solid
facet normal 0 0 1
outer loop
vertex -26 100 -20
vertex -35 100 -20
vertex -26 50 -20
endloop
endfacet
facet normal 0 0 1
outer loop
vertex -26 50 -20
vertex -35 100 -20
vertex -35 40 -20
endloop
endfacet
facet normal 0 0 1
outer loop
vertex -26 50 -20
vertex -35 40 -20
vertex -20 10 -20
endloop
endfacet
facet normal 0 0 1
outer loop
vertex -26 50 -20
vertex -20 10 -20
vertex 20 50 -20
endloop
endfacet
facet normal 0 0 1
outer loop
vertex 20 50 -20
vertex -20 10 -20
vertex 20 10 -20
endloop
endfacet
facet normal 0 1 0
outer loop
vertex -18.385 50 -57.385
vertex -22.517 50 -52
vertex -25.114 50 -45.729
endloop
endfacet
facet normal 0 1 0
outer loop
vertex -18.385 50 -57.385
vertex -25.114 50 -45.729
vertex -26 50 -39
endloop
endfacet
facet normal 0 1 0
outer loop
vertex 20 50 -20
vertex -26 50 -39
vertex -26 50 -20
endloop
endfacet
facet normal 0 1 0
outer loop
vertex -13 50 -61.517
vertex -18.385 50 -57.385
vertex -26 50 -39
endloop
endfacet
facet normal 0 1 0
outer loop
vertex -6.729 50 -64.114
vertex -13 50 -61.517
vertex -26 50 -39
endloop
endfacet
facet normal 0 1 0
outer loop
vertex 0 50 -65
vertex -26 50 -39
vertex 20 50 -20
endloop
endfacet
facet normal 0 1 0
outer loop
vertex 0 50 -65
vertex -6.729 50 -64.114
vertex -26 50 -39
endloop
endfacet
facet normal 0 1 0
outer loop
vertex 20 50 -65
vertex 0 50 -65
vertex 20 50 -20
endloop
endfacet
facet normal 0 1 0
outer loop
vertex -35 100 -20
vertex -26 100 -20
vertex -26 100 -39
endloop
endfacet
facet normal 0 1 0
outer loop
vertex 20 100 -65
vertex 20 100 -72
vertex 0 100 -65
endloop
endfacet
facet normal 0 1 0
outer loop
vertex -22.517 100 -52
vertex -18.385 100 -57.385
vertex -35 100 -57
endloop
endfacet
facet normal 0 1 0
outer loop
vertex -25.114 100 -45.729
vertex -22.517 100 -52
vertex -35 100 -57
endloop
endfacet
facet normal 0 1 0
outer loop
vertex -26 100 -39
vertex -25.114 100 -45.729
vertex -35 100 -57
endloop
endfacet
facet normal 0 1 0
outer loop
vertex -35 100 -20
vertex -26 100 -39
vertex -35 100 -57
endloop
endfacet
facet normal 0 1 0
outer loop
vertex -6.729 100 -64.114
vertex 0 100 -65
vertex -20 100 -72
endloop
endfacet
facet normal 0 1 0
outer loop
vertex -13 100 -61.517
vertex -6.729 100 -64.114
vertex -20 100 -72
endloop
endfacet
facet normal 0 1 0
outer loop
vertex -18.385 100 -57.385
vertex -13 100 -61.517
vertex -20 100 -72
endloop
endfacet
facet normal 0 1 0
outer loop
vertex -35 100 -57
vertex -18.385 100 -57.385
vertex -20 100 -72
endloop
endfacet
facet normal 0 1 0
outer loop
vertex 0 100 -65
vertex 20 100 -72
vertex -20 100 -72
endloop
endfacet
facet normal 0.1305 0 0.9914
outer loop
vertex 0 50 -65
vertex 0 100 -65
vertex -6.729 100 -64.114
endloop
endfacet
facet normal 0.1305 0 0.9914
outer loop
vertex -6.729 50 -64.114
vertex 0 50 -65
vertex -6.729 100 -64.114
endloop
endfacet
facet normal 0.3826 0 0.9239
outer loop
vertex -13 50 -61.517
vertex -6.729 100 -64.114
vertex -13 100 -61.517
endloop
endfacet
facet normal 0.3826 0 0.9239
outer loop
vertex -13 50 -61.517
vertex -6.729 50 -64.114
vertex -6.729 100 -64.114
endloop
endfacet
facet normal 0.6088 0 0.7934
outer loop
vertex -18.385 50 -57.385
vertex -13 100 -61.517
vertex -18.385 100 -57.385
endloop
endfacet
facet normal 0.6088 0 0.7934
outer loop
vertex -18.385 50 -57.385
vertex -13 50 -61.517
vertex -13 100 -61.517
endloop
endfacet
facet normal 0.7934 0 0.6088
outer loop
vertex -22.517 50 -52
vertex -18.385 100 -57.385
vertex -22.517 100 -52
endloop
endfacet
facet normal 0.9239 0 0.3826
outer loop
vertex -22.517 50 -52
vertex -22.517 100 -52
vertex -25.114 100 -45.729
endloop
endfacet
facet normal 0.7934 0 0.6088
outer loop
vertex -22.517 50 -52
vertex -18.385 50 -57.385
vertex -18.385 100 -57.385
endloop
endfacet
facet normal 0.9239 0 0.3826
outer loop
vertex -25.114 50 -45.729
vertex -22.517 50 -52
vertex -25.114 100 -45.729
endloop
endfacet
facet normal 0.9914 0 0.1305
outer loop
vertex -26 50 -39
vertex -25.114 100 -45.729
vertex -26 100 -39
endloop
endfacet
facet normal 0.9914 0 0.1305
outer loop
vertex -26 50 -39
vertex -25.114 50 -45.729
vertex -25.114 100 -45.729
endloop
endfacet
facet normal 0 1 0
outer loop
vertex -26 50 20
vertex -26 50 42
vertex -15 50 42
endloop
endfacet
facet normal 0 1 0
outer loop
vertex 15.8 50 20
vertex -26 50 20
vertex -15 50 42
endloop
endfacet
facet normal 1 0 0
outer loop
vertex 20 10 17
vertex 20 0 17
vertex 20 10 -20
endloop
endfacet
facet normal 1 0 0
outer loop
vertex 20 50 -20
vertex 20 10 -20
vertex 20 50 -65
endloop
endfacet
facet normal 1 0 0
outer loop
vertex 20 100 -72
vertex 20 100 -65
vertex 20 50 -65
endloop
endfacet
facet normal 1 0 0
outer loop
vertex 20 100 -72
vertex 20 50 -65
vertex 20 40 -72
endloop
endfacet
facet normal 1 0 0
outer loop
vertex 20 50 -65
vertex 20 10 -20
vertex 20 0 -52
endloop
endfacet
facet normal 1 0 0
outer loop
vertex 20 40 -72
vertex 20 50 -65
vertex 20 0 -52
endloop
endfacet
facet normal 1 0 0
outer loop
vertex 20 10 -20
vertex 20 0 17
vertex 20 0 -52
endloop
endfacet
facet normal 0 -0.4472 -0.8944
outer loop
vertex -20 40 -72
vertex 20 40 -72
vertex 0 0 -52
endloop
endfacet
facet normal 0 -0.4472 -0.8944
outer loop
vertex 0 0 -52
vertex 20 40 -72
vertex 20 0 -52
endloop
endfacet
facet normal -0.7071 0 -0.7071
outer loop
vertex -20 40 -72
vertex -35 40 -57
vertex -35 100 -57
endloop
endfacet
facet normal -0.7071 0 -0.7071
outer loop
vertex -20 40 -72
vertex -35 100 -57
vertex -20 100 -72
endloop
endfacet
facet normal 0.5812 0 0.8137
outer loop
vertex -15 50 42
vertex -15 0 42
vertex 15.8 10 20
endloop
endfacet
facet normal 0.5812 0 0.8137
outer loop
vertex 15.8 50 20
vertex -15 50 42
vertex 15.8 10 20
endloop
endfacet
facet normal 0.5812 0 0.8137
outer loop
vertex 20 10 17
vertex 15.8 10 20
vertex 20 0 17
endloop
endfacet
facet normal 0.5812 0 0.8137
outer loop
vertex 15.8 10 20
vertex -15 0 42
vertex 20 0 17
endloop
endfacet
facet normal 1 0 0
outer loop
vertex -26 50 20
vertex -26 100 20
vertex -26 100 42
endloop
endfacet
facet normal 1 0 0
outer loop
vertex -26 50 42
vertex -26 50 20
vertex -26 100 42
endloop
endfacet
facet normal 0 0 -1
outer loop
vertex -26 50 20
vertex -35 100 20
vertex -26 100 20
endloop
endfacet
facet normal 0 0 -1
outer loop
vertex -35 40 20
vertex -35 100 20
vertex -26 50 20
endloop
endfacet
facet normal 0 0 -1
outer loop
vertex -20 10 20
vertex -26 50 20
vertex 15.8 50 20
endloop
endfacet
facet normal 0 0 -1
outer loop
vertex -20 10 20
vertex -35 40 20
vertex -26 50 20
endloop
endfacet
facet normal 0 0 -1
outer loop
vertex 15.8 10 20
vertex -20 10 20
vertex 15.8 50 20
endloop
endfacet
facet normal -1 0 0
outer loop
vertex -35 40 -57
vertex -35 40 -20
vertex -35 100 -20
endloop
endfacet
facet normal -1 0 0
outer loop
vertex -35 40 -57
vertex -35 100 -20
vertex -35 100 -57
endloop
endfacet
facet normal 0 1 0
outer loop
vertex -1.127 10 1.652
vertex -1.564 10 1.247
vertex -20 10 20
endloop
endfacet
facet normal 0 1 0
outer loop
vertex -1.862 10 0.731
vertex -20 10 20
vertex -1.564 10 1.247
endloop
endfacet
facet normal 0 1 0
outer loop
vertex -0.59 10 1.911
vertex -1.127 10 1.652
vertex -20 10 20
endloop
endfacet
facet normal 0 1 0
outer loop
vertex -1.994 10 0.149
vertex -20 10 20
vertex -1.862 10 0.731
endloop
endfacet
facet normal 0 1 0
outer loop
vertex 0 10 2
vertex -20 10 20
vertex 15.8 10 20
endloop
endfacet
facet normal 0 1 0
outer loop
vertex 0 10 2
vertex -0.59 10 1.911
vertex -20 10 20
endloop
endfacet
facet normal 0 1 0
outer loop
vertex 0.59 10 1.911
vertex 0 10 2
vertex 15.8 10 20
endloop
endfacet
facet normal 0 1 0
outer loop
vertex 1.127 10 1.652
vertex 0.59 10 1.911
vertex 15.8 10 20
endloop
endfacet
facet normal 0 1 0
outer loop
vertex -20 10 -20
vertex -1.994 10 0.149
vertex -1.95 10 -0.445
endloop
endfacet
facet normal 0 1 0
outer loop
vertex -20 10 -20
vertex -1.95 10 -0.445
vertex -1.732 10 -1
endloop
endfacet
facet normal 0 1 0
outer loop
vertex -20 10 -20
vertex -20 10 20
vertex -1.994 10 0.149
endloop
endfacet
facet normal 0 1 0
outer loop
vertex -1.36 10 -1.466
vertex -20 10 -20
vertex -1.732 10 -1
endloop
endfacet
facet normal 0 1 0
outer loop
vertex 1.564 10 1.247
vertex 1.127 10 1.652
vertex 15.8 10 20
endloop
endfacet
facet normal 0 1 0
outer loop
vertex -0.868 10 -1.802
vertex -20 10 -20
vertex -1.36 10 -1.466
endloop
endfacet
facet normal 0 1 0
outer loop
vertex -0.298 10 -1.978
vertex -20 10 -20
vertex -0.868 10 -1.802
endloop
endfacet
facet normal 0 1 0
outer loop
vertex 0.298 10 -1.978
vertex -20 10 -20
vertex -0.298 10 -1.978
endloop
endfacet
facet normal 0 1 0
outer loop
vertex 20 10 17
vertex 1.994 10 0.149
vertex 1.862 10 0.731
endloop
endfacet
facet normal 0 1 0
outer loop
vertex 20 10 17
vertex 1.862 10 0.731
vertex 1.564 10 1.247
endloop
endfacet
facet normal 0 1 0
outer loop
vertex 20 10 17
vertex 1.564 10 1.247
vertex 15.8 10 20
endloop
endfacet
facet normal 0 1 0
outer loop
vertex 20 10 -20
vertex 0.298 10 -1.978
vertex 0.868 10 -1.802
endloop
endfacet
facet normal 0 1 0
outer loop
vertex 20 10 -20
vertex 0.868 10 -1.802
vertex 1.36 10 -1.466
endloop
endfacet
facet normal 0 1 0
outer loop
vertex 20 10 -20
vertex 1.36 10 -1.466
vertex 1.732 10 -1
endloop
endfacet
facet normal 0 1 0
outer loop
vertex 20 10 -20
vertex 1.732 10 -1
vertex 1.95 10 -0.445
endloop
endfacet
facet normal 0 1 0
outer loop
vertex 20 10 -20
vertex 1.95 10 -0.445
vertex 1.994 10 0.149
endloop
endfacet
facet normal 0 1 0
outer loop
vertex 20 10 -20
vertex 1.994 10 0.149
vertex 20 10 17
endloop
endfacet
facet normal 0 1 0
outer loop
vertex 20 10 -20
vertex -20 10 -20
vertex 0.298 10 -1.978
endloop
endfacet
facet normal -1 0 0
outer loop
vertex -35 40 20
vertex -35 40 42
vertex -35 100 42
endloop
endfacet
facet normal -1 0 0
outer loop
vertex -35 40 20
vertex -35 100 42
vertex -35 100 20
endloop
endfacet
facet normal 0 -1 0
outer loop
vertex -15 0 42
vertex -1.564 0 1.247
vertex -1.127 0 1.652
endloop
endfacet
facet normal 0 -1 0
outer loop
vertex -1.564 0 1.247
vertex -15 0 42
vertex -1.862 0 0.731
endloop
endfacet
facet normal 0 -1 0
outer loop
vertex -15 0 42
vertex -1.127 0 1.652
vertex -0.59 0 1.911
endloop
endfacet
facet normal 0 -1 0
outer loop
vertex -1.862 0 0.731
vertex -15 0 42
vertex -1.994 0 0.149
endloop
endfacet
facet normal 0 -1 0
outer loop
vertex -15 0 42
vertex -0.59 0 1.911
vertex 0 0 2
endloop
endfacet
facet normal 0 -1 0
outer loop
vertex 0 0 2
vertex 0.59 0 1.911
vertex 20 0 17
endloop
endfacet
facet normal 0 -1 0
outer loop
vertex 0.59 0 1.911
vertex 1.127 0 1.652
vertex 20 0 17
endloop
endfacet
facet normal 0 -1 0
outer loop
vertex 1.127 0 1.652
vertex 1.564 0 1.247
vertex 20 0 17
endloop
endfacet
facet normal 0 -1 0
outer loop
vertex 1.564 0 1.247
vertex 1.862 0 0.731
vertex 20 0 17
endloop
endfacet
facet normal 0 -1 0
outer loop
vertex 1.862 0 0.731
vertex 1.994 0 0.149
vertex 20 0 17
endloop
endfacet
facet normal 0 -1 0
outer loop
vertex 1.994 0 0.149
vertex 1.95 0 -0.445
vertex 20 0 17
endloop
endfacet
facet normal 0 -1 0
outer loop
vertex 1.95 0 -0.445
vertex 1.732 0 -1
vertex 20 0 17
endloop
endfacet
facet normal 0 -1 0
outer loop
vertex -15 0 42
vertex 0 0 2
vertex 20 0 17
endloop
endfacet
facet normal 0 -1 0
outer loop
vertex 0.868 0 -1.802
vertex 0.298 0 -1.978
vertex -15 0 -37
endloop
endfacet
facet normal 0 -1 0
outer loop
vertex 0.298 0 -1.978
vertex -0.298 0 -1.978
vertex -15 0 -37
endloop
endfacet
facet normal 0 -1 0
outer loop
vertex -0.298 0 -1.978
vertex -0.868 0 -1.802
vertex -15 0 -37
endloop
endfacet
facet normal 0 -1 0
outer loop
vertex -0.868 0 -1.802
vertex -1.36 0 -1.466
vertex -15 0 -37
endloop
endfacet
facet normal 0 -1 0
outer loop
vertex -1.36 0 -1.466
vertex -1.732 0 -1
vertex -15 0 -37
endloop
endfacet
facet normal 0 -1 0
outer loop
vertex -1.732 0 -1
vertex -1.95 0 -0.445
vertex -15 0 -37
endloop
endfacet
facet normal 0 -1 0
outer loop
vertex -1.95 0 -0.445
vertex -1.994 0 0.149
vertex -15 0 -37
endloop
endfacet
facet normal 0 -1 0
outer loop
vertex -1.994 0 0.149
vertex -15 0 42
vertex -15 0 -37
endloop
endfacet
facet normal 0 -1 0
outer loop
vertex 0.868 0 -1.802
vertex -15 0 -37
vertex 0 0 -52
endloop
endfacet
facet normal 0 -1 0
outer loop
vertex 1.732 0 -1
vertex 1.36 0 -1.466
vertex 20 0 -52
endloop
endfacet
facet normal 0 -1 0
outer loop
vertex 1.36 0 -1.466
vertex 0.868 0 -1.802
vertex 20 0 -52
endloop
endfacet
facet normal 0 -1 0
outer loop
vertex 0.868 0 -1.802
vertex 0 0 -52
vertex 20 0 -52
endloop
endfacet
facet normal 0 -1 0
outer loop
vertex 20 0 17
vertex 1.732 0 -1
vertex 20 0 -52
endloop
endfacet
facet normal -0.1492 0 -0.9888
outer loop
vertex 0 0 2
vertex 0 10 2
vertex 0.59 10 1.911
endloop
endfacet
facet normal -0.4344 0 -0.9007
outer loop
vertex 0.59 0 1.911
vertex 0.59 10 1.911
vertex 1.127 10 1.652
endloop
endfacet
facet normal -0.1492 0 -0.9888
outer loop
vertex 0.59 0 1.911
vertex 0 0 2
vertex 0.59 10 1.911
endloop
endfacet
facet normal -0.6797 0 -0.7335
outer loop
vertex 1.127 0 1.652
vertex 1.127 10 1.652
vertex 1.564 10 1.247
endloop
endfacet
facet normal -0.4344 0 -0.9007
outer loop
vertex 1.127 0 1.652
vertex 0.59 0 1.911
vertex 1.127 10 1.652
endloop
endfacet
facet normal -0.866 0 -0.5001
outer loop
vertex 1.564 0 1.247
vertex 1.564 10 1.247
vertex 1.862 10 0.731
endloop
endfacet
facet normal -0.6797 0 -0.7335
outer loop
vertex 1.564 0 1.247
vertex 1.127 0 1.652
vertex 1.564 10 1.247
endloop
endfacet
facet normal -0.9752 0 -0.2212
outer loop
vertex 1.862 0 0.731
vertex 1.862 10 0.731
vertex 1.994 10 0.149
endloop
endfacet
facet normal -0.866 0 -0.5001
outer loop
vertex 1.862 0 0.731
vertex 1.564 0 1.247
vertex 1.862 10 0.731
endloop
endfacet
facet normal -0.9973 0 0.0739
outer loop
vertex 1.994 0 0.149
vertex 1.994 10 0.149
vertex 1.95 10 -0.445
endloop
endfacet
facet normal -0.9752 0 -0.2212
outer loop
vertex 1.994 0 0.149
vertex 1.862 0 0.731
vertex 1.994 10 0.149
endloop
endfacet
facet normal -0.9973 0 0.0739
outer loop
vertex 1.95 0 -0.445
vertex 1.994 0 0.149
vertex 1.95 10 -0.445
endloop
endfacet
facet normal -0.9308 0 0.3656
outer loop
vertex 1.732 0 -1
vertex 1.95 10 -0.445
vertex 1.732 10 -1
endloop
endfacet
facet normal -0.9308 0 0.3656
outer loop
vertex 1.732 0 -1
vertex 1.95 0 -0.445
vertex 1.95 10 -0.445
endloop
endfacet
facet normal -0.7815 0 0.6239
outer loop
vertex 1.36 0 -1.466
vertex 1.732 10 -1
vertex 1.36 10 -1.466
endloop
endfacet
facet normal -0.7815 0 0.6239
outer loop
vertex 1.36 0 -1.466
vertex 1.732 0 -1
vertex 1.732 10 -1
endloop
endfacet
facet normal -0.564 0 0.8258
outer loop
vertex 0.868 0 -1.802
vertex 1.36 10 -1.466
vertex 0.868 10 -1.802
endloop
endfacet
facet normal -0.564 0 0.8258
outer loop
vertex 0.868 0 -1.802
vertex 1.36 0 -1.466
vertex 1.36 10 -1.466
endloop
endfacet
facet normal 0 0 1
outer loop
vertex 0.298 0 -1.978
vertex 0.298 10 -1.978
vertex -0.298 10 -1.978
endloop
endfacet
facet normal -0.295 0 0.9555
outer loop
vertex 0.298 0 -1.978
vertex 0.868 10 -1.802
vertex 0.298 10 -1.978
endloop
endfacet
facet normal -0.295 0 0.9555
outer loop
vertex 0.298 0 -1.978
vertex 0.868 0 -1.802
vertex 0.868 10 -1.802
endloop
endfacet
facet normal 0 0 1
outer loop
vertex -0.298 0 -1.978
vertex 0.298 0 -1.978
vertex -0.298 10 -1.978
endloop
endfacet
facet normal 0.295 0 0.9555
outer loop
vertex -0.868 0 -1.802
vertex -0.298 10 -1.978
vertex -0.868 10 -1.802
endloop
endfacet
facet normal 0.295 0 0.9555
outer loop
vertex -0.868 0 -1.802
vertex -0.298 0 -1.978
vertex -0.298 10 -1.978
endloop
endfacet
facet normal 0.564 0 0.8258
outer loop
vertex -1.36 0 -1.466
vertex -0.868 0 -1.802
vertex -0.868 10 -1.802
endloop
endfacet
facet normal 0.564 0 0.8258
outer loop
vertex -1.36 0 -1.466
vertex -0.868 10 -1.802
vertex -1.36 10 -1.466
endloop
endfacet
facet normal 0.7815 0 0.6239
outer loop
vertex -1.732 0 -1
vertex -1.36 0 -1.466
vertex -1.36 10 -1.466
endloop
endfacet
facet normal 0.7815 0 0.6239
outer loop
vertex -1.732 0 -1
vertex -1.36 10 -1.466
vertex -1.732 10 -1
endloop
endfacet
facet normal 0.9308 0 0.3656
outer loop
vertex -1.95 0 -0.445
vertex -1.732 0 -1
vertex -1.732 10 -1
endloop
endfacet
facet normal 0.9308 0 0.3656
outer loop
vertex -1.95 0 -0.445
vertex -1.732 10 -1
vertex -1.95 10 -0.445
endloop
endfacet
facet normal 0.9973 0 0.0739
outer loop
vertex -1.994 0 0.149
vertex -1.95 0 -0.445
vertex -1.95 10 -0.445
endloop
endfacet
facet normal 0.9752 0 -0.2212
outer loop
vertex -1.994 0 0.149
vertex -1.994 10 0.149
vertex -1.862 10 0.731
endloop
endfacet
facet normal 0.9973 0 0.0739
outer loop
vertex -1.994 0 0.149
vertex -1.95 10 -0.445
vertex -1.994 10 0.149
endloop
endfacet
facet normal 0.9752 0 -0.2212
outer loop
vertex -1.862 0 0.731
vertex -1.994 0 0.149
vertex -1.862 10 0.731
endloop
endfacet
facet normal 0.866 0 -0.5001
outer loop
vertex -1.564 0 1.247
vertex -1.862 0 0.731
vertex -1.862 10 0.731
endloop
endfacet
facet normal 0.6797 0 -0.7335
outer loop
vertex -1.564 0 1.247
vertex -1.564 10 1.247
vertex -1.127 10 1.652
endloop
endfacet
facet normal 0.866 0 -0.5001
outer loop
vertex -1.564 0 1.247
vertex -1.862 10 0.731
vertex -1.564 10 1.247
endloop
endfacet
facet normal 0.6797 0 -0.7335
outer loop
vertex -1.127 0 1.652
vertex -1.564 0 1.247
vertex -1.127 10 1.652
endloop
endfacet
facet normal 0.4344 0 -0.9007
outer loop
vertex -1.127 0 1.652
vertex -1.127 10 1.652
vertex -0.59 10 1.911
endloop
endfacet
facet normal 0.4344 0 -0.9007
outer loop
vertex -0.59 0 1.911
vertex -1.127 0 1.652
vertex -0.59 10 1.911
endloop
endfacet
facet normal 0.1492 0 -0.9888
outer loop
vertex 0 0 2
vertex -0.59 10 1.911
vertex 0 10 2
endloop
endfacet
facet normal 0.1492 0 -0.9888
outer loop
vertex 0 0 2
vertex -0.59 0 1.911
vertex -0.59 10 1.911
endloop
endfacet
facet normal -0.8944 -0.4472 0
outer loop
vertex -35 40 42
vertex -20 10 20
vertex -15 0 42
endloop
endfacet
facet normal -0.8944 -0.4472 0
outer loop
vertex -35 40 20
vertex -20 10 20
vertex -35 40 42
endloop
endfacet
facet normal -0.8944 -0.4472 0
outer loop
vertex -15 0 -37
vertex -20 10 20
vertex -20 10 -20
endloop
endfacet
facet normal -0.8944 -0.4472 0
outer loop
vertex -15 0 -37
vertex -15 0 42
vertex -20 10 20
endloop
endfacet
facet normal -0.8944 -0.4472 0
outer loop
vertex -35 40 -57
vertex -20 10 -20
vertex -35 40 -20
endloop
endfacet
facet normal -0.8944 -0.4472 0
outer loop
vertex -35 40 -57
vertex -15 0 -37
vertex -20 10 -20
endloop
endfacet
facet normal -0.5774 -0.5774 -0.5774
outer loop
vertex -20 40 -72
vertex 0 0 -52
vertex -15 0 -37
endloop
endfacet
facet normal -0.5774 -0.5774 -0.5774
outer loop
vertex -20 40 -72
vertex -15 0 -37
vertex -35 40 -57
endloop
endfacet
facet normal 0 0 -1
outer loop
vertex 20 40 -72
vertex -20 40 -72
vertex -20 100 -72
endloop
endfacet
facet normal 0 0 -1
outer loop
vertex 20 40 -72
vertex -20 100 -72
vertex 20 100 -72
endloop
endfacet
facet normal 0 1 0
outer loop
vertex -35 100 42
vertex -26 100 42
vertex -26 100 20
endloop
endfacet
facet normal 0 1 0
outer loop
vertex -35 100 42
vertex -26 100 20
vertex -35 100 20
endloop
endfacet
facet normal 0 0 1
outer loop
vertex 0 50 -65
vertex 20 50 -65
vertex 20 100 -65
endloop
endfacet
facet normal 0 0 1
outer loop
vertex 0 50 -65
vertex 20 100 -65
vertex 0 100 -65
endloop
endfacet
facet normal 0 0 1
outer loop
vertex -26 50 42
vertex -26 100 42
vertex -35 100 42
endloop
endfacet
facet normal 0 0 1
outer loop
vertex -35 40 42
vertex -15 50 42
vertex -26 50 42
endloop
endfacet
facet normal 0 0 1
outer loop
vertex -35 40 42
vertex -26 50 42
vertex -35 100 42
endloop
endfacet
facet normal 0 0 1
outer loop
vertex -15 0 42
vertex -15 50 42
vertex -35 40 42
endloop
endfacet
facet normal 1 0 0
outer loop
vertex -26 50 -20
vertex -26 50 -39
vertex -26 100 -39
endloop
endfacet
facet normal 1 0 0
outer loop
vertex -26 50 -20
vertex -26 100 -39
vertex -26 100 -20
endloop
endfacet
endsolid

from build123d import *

# Parameters (mm, degrees)
SKETCH_1_R               = 2
EXTRUDE_1_DEPTH          = 50
CHAMFER_1_SIZE           = 15
EXTRUDE_2_DEPTH          = 50
CUT_EXTRUDE_1_DEPTH      = 50
CUT_EXTRUDE_1_DEPTH_BACK = 40
SKETCH_3_W               = 55
SKETCH_3_H               = 40
CUT_EXTRUDE_2_DEPTH      = 156.630973781
CUT_EXTRUDE_3_DEPTH      = 135.940727729
CHAMFER_2_SIZE           = 13.693


with BuildPart() as part:
    # 草图1 → 凸台-拉伸1 (new body)
    with BuildSketch(Plane(origin=(0, 0, 0), x_dir=(1, 0, 0), z_dir=(0, 1, 0))):
        Polygon((-35, 72), (-35, -42), (-15, -42), (20, -17), (20, 14.02557275), (20, 72), align=None)
        with Locations(Location((0, 0, 0), (0, 0, 270))):
            Circle(SKETCH_1_R, mode=Mode.SUBTRACT)
    extrude(amount=EXTRUDE_1_DEPTH)

    # 倒角1
    chamfer_1_edges = [part.edges().sort_by_distance(p)[0] for p in [
        (-35, 25, -72),
    ]]
    chamfer(chamfer_1_edges, length=CHAMFER_1_SIZE)

    # 草图2 → 凸台-拉伸2 (add)
    with BuildSketch(Plane(origin=(0, 50, 0), x_dir=(1, 0, 0), z_dir=(0, 1, 0))):
        with BuildLine():
            Line((-26, 39), (-26, -42))
            Line((-26, -42), (-35, -42))
            Line((-35, -42), (-35, 57))
            Line((-35, 57), (-20, 72))
            Line((-20, 72), (20, 72))
            Line((20, 72), (20, 65))
            Line((20, 65), (0, 65))
            ThreePointArc((0, 65), (-18.384776311, 57.384776311), (-26, 39))
        make_face()
    extrude(amount=EXTRUDE_2_DEPTH)

    # 草图3 → 切除-拉伸1 (cut, two sides: drawn at the far end of the back side and taken through both)
    with BuildSketch(Plane(origin=(0, 50, 0), x_dir=(1, 0, 0), z_dir=(0, 1, 0)).offset(-CUT_EXTRUDE_1_DEPTH_BACK)):
        with Locations((-7.5, 0)):
            Rectangle(SKETCH_3_W, SKETCH_3_H)
    extrude(amount=CUT_EXTRUDE_1_DEPTH + CUT_EXTRUDE_1_DEPTH_BACK, mode=Mode.SUBTRACT)

    # 草图4 → 切除-拉伸2 (cut, through all)
    with BuildSketch(Plane(origin=(0, 0, -72), x_dir=(-1, 0, 0), z_dir=(0, 0, -1))):
        Polygon((15, 0), (35, 40), (35, 0), align=None)
    extrude(amount=-CUT_EXTRUDE_2_DEPTH, mode=Mode.SUBTRACT)

    # 草图5 → 切除-拉伸3 (cut, through all)
    with BuildSketch(Plane(origin=(20, 0, 0), x_dir=(0, 0, -1), z_dir=(1, 0, 0))):
        Polygon((52, 0), (72, 0), (72, 40), align=None)
    extrude(amount=-CUT_EXTRUDE_3_DEPTH, mode=Mode.SUBTRACT)

    # 倒角2
    chamfer_2_edges = [part.edges().sort_by_distance(p)[0] for p in [
        (-21.25, 12.5, -58.25),
    ]]
    chamfer(chamfer_2_edges, length=CHAMFER_2_SIZE)


solid = part.part
